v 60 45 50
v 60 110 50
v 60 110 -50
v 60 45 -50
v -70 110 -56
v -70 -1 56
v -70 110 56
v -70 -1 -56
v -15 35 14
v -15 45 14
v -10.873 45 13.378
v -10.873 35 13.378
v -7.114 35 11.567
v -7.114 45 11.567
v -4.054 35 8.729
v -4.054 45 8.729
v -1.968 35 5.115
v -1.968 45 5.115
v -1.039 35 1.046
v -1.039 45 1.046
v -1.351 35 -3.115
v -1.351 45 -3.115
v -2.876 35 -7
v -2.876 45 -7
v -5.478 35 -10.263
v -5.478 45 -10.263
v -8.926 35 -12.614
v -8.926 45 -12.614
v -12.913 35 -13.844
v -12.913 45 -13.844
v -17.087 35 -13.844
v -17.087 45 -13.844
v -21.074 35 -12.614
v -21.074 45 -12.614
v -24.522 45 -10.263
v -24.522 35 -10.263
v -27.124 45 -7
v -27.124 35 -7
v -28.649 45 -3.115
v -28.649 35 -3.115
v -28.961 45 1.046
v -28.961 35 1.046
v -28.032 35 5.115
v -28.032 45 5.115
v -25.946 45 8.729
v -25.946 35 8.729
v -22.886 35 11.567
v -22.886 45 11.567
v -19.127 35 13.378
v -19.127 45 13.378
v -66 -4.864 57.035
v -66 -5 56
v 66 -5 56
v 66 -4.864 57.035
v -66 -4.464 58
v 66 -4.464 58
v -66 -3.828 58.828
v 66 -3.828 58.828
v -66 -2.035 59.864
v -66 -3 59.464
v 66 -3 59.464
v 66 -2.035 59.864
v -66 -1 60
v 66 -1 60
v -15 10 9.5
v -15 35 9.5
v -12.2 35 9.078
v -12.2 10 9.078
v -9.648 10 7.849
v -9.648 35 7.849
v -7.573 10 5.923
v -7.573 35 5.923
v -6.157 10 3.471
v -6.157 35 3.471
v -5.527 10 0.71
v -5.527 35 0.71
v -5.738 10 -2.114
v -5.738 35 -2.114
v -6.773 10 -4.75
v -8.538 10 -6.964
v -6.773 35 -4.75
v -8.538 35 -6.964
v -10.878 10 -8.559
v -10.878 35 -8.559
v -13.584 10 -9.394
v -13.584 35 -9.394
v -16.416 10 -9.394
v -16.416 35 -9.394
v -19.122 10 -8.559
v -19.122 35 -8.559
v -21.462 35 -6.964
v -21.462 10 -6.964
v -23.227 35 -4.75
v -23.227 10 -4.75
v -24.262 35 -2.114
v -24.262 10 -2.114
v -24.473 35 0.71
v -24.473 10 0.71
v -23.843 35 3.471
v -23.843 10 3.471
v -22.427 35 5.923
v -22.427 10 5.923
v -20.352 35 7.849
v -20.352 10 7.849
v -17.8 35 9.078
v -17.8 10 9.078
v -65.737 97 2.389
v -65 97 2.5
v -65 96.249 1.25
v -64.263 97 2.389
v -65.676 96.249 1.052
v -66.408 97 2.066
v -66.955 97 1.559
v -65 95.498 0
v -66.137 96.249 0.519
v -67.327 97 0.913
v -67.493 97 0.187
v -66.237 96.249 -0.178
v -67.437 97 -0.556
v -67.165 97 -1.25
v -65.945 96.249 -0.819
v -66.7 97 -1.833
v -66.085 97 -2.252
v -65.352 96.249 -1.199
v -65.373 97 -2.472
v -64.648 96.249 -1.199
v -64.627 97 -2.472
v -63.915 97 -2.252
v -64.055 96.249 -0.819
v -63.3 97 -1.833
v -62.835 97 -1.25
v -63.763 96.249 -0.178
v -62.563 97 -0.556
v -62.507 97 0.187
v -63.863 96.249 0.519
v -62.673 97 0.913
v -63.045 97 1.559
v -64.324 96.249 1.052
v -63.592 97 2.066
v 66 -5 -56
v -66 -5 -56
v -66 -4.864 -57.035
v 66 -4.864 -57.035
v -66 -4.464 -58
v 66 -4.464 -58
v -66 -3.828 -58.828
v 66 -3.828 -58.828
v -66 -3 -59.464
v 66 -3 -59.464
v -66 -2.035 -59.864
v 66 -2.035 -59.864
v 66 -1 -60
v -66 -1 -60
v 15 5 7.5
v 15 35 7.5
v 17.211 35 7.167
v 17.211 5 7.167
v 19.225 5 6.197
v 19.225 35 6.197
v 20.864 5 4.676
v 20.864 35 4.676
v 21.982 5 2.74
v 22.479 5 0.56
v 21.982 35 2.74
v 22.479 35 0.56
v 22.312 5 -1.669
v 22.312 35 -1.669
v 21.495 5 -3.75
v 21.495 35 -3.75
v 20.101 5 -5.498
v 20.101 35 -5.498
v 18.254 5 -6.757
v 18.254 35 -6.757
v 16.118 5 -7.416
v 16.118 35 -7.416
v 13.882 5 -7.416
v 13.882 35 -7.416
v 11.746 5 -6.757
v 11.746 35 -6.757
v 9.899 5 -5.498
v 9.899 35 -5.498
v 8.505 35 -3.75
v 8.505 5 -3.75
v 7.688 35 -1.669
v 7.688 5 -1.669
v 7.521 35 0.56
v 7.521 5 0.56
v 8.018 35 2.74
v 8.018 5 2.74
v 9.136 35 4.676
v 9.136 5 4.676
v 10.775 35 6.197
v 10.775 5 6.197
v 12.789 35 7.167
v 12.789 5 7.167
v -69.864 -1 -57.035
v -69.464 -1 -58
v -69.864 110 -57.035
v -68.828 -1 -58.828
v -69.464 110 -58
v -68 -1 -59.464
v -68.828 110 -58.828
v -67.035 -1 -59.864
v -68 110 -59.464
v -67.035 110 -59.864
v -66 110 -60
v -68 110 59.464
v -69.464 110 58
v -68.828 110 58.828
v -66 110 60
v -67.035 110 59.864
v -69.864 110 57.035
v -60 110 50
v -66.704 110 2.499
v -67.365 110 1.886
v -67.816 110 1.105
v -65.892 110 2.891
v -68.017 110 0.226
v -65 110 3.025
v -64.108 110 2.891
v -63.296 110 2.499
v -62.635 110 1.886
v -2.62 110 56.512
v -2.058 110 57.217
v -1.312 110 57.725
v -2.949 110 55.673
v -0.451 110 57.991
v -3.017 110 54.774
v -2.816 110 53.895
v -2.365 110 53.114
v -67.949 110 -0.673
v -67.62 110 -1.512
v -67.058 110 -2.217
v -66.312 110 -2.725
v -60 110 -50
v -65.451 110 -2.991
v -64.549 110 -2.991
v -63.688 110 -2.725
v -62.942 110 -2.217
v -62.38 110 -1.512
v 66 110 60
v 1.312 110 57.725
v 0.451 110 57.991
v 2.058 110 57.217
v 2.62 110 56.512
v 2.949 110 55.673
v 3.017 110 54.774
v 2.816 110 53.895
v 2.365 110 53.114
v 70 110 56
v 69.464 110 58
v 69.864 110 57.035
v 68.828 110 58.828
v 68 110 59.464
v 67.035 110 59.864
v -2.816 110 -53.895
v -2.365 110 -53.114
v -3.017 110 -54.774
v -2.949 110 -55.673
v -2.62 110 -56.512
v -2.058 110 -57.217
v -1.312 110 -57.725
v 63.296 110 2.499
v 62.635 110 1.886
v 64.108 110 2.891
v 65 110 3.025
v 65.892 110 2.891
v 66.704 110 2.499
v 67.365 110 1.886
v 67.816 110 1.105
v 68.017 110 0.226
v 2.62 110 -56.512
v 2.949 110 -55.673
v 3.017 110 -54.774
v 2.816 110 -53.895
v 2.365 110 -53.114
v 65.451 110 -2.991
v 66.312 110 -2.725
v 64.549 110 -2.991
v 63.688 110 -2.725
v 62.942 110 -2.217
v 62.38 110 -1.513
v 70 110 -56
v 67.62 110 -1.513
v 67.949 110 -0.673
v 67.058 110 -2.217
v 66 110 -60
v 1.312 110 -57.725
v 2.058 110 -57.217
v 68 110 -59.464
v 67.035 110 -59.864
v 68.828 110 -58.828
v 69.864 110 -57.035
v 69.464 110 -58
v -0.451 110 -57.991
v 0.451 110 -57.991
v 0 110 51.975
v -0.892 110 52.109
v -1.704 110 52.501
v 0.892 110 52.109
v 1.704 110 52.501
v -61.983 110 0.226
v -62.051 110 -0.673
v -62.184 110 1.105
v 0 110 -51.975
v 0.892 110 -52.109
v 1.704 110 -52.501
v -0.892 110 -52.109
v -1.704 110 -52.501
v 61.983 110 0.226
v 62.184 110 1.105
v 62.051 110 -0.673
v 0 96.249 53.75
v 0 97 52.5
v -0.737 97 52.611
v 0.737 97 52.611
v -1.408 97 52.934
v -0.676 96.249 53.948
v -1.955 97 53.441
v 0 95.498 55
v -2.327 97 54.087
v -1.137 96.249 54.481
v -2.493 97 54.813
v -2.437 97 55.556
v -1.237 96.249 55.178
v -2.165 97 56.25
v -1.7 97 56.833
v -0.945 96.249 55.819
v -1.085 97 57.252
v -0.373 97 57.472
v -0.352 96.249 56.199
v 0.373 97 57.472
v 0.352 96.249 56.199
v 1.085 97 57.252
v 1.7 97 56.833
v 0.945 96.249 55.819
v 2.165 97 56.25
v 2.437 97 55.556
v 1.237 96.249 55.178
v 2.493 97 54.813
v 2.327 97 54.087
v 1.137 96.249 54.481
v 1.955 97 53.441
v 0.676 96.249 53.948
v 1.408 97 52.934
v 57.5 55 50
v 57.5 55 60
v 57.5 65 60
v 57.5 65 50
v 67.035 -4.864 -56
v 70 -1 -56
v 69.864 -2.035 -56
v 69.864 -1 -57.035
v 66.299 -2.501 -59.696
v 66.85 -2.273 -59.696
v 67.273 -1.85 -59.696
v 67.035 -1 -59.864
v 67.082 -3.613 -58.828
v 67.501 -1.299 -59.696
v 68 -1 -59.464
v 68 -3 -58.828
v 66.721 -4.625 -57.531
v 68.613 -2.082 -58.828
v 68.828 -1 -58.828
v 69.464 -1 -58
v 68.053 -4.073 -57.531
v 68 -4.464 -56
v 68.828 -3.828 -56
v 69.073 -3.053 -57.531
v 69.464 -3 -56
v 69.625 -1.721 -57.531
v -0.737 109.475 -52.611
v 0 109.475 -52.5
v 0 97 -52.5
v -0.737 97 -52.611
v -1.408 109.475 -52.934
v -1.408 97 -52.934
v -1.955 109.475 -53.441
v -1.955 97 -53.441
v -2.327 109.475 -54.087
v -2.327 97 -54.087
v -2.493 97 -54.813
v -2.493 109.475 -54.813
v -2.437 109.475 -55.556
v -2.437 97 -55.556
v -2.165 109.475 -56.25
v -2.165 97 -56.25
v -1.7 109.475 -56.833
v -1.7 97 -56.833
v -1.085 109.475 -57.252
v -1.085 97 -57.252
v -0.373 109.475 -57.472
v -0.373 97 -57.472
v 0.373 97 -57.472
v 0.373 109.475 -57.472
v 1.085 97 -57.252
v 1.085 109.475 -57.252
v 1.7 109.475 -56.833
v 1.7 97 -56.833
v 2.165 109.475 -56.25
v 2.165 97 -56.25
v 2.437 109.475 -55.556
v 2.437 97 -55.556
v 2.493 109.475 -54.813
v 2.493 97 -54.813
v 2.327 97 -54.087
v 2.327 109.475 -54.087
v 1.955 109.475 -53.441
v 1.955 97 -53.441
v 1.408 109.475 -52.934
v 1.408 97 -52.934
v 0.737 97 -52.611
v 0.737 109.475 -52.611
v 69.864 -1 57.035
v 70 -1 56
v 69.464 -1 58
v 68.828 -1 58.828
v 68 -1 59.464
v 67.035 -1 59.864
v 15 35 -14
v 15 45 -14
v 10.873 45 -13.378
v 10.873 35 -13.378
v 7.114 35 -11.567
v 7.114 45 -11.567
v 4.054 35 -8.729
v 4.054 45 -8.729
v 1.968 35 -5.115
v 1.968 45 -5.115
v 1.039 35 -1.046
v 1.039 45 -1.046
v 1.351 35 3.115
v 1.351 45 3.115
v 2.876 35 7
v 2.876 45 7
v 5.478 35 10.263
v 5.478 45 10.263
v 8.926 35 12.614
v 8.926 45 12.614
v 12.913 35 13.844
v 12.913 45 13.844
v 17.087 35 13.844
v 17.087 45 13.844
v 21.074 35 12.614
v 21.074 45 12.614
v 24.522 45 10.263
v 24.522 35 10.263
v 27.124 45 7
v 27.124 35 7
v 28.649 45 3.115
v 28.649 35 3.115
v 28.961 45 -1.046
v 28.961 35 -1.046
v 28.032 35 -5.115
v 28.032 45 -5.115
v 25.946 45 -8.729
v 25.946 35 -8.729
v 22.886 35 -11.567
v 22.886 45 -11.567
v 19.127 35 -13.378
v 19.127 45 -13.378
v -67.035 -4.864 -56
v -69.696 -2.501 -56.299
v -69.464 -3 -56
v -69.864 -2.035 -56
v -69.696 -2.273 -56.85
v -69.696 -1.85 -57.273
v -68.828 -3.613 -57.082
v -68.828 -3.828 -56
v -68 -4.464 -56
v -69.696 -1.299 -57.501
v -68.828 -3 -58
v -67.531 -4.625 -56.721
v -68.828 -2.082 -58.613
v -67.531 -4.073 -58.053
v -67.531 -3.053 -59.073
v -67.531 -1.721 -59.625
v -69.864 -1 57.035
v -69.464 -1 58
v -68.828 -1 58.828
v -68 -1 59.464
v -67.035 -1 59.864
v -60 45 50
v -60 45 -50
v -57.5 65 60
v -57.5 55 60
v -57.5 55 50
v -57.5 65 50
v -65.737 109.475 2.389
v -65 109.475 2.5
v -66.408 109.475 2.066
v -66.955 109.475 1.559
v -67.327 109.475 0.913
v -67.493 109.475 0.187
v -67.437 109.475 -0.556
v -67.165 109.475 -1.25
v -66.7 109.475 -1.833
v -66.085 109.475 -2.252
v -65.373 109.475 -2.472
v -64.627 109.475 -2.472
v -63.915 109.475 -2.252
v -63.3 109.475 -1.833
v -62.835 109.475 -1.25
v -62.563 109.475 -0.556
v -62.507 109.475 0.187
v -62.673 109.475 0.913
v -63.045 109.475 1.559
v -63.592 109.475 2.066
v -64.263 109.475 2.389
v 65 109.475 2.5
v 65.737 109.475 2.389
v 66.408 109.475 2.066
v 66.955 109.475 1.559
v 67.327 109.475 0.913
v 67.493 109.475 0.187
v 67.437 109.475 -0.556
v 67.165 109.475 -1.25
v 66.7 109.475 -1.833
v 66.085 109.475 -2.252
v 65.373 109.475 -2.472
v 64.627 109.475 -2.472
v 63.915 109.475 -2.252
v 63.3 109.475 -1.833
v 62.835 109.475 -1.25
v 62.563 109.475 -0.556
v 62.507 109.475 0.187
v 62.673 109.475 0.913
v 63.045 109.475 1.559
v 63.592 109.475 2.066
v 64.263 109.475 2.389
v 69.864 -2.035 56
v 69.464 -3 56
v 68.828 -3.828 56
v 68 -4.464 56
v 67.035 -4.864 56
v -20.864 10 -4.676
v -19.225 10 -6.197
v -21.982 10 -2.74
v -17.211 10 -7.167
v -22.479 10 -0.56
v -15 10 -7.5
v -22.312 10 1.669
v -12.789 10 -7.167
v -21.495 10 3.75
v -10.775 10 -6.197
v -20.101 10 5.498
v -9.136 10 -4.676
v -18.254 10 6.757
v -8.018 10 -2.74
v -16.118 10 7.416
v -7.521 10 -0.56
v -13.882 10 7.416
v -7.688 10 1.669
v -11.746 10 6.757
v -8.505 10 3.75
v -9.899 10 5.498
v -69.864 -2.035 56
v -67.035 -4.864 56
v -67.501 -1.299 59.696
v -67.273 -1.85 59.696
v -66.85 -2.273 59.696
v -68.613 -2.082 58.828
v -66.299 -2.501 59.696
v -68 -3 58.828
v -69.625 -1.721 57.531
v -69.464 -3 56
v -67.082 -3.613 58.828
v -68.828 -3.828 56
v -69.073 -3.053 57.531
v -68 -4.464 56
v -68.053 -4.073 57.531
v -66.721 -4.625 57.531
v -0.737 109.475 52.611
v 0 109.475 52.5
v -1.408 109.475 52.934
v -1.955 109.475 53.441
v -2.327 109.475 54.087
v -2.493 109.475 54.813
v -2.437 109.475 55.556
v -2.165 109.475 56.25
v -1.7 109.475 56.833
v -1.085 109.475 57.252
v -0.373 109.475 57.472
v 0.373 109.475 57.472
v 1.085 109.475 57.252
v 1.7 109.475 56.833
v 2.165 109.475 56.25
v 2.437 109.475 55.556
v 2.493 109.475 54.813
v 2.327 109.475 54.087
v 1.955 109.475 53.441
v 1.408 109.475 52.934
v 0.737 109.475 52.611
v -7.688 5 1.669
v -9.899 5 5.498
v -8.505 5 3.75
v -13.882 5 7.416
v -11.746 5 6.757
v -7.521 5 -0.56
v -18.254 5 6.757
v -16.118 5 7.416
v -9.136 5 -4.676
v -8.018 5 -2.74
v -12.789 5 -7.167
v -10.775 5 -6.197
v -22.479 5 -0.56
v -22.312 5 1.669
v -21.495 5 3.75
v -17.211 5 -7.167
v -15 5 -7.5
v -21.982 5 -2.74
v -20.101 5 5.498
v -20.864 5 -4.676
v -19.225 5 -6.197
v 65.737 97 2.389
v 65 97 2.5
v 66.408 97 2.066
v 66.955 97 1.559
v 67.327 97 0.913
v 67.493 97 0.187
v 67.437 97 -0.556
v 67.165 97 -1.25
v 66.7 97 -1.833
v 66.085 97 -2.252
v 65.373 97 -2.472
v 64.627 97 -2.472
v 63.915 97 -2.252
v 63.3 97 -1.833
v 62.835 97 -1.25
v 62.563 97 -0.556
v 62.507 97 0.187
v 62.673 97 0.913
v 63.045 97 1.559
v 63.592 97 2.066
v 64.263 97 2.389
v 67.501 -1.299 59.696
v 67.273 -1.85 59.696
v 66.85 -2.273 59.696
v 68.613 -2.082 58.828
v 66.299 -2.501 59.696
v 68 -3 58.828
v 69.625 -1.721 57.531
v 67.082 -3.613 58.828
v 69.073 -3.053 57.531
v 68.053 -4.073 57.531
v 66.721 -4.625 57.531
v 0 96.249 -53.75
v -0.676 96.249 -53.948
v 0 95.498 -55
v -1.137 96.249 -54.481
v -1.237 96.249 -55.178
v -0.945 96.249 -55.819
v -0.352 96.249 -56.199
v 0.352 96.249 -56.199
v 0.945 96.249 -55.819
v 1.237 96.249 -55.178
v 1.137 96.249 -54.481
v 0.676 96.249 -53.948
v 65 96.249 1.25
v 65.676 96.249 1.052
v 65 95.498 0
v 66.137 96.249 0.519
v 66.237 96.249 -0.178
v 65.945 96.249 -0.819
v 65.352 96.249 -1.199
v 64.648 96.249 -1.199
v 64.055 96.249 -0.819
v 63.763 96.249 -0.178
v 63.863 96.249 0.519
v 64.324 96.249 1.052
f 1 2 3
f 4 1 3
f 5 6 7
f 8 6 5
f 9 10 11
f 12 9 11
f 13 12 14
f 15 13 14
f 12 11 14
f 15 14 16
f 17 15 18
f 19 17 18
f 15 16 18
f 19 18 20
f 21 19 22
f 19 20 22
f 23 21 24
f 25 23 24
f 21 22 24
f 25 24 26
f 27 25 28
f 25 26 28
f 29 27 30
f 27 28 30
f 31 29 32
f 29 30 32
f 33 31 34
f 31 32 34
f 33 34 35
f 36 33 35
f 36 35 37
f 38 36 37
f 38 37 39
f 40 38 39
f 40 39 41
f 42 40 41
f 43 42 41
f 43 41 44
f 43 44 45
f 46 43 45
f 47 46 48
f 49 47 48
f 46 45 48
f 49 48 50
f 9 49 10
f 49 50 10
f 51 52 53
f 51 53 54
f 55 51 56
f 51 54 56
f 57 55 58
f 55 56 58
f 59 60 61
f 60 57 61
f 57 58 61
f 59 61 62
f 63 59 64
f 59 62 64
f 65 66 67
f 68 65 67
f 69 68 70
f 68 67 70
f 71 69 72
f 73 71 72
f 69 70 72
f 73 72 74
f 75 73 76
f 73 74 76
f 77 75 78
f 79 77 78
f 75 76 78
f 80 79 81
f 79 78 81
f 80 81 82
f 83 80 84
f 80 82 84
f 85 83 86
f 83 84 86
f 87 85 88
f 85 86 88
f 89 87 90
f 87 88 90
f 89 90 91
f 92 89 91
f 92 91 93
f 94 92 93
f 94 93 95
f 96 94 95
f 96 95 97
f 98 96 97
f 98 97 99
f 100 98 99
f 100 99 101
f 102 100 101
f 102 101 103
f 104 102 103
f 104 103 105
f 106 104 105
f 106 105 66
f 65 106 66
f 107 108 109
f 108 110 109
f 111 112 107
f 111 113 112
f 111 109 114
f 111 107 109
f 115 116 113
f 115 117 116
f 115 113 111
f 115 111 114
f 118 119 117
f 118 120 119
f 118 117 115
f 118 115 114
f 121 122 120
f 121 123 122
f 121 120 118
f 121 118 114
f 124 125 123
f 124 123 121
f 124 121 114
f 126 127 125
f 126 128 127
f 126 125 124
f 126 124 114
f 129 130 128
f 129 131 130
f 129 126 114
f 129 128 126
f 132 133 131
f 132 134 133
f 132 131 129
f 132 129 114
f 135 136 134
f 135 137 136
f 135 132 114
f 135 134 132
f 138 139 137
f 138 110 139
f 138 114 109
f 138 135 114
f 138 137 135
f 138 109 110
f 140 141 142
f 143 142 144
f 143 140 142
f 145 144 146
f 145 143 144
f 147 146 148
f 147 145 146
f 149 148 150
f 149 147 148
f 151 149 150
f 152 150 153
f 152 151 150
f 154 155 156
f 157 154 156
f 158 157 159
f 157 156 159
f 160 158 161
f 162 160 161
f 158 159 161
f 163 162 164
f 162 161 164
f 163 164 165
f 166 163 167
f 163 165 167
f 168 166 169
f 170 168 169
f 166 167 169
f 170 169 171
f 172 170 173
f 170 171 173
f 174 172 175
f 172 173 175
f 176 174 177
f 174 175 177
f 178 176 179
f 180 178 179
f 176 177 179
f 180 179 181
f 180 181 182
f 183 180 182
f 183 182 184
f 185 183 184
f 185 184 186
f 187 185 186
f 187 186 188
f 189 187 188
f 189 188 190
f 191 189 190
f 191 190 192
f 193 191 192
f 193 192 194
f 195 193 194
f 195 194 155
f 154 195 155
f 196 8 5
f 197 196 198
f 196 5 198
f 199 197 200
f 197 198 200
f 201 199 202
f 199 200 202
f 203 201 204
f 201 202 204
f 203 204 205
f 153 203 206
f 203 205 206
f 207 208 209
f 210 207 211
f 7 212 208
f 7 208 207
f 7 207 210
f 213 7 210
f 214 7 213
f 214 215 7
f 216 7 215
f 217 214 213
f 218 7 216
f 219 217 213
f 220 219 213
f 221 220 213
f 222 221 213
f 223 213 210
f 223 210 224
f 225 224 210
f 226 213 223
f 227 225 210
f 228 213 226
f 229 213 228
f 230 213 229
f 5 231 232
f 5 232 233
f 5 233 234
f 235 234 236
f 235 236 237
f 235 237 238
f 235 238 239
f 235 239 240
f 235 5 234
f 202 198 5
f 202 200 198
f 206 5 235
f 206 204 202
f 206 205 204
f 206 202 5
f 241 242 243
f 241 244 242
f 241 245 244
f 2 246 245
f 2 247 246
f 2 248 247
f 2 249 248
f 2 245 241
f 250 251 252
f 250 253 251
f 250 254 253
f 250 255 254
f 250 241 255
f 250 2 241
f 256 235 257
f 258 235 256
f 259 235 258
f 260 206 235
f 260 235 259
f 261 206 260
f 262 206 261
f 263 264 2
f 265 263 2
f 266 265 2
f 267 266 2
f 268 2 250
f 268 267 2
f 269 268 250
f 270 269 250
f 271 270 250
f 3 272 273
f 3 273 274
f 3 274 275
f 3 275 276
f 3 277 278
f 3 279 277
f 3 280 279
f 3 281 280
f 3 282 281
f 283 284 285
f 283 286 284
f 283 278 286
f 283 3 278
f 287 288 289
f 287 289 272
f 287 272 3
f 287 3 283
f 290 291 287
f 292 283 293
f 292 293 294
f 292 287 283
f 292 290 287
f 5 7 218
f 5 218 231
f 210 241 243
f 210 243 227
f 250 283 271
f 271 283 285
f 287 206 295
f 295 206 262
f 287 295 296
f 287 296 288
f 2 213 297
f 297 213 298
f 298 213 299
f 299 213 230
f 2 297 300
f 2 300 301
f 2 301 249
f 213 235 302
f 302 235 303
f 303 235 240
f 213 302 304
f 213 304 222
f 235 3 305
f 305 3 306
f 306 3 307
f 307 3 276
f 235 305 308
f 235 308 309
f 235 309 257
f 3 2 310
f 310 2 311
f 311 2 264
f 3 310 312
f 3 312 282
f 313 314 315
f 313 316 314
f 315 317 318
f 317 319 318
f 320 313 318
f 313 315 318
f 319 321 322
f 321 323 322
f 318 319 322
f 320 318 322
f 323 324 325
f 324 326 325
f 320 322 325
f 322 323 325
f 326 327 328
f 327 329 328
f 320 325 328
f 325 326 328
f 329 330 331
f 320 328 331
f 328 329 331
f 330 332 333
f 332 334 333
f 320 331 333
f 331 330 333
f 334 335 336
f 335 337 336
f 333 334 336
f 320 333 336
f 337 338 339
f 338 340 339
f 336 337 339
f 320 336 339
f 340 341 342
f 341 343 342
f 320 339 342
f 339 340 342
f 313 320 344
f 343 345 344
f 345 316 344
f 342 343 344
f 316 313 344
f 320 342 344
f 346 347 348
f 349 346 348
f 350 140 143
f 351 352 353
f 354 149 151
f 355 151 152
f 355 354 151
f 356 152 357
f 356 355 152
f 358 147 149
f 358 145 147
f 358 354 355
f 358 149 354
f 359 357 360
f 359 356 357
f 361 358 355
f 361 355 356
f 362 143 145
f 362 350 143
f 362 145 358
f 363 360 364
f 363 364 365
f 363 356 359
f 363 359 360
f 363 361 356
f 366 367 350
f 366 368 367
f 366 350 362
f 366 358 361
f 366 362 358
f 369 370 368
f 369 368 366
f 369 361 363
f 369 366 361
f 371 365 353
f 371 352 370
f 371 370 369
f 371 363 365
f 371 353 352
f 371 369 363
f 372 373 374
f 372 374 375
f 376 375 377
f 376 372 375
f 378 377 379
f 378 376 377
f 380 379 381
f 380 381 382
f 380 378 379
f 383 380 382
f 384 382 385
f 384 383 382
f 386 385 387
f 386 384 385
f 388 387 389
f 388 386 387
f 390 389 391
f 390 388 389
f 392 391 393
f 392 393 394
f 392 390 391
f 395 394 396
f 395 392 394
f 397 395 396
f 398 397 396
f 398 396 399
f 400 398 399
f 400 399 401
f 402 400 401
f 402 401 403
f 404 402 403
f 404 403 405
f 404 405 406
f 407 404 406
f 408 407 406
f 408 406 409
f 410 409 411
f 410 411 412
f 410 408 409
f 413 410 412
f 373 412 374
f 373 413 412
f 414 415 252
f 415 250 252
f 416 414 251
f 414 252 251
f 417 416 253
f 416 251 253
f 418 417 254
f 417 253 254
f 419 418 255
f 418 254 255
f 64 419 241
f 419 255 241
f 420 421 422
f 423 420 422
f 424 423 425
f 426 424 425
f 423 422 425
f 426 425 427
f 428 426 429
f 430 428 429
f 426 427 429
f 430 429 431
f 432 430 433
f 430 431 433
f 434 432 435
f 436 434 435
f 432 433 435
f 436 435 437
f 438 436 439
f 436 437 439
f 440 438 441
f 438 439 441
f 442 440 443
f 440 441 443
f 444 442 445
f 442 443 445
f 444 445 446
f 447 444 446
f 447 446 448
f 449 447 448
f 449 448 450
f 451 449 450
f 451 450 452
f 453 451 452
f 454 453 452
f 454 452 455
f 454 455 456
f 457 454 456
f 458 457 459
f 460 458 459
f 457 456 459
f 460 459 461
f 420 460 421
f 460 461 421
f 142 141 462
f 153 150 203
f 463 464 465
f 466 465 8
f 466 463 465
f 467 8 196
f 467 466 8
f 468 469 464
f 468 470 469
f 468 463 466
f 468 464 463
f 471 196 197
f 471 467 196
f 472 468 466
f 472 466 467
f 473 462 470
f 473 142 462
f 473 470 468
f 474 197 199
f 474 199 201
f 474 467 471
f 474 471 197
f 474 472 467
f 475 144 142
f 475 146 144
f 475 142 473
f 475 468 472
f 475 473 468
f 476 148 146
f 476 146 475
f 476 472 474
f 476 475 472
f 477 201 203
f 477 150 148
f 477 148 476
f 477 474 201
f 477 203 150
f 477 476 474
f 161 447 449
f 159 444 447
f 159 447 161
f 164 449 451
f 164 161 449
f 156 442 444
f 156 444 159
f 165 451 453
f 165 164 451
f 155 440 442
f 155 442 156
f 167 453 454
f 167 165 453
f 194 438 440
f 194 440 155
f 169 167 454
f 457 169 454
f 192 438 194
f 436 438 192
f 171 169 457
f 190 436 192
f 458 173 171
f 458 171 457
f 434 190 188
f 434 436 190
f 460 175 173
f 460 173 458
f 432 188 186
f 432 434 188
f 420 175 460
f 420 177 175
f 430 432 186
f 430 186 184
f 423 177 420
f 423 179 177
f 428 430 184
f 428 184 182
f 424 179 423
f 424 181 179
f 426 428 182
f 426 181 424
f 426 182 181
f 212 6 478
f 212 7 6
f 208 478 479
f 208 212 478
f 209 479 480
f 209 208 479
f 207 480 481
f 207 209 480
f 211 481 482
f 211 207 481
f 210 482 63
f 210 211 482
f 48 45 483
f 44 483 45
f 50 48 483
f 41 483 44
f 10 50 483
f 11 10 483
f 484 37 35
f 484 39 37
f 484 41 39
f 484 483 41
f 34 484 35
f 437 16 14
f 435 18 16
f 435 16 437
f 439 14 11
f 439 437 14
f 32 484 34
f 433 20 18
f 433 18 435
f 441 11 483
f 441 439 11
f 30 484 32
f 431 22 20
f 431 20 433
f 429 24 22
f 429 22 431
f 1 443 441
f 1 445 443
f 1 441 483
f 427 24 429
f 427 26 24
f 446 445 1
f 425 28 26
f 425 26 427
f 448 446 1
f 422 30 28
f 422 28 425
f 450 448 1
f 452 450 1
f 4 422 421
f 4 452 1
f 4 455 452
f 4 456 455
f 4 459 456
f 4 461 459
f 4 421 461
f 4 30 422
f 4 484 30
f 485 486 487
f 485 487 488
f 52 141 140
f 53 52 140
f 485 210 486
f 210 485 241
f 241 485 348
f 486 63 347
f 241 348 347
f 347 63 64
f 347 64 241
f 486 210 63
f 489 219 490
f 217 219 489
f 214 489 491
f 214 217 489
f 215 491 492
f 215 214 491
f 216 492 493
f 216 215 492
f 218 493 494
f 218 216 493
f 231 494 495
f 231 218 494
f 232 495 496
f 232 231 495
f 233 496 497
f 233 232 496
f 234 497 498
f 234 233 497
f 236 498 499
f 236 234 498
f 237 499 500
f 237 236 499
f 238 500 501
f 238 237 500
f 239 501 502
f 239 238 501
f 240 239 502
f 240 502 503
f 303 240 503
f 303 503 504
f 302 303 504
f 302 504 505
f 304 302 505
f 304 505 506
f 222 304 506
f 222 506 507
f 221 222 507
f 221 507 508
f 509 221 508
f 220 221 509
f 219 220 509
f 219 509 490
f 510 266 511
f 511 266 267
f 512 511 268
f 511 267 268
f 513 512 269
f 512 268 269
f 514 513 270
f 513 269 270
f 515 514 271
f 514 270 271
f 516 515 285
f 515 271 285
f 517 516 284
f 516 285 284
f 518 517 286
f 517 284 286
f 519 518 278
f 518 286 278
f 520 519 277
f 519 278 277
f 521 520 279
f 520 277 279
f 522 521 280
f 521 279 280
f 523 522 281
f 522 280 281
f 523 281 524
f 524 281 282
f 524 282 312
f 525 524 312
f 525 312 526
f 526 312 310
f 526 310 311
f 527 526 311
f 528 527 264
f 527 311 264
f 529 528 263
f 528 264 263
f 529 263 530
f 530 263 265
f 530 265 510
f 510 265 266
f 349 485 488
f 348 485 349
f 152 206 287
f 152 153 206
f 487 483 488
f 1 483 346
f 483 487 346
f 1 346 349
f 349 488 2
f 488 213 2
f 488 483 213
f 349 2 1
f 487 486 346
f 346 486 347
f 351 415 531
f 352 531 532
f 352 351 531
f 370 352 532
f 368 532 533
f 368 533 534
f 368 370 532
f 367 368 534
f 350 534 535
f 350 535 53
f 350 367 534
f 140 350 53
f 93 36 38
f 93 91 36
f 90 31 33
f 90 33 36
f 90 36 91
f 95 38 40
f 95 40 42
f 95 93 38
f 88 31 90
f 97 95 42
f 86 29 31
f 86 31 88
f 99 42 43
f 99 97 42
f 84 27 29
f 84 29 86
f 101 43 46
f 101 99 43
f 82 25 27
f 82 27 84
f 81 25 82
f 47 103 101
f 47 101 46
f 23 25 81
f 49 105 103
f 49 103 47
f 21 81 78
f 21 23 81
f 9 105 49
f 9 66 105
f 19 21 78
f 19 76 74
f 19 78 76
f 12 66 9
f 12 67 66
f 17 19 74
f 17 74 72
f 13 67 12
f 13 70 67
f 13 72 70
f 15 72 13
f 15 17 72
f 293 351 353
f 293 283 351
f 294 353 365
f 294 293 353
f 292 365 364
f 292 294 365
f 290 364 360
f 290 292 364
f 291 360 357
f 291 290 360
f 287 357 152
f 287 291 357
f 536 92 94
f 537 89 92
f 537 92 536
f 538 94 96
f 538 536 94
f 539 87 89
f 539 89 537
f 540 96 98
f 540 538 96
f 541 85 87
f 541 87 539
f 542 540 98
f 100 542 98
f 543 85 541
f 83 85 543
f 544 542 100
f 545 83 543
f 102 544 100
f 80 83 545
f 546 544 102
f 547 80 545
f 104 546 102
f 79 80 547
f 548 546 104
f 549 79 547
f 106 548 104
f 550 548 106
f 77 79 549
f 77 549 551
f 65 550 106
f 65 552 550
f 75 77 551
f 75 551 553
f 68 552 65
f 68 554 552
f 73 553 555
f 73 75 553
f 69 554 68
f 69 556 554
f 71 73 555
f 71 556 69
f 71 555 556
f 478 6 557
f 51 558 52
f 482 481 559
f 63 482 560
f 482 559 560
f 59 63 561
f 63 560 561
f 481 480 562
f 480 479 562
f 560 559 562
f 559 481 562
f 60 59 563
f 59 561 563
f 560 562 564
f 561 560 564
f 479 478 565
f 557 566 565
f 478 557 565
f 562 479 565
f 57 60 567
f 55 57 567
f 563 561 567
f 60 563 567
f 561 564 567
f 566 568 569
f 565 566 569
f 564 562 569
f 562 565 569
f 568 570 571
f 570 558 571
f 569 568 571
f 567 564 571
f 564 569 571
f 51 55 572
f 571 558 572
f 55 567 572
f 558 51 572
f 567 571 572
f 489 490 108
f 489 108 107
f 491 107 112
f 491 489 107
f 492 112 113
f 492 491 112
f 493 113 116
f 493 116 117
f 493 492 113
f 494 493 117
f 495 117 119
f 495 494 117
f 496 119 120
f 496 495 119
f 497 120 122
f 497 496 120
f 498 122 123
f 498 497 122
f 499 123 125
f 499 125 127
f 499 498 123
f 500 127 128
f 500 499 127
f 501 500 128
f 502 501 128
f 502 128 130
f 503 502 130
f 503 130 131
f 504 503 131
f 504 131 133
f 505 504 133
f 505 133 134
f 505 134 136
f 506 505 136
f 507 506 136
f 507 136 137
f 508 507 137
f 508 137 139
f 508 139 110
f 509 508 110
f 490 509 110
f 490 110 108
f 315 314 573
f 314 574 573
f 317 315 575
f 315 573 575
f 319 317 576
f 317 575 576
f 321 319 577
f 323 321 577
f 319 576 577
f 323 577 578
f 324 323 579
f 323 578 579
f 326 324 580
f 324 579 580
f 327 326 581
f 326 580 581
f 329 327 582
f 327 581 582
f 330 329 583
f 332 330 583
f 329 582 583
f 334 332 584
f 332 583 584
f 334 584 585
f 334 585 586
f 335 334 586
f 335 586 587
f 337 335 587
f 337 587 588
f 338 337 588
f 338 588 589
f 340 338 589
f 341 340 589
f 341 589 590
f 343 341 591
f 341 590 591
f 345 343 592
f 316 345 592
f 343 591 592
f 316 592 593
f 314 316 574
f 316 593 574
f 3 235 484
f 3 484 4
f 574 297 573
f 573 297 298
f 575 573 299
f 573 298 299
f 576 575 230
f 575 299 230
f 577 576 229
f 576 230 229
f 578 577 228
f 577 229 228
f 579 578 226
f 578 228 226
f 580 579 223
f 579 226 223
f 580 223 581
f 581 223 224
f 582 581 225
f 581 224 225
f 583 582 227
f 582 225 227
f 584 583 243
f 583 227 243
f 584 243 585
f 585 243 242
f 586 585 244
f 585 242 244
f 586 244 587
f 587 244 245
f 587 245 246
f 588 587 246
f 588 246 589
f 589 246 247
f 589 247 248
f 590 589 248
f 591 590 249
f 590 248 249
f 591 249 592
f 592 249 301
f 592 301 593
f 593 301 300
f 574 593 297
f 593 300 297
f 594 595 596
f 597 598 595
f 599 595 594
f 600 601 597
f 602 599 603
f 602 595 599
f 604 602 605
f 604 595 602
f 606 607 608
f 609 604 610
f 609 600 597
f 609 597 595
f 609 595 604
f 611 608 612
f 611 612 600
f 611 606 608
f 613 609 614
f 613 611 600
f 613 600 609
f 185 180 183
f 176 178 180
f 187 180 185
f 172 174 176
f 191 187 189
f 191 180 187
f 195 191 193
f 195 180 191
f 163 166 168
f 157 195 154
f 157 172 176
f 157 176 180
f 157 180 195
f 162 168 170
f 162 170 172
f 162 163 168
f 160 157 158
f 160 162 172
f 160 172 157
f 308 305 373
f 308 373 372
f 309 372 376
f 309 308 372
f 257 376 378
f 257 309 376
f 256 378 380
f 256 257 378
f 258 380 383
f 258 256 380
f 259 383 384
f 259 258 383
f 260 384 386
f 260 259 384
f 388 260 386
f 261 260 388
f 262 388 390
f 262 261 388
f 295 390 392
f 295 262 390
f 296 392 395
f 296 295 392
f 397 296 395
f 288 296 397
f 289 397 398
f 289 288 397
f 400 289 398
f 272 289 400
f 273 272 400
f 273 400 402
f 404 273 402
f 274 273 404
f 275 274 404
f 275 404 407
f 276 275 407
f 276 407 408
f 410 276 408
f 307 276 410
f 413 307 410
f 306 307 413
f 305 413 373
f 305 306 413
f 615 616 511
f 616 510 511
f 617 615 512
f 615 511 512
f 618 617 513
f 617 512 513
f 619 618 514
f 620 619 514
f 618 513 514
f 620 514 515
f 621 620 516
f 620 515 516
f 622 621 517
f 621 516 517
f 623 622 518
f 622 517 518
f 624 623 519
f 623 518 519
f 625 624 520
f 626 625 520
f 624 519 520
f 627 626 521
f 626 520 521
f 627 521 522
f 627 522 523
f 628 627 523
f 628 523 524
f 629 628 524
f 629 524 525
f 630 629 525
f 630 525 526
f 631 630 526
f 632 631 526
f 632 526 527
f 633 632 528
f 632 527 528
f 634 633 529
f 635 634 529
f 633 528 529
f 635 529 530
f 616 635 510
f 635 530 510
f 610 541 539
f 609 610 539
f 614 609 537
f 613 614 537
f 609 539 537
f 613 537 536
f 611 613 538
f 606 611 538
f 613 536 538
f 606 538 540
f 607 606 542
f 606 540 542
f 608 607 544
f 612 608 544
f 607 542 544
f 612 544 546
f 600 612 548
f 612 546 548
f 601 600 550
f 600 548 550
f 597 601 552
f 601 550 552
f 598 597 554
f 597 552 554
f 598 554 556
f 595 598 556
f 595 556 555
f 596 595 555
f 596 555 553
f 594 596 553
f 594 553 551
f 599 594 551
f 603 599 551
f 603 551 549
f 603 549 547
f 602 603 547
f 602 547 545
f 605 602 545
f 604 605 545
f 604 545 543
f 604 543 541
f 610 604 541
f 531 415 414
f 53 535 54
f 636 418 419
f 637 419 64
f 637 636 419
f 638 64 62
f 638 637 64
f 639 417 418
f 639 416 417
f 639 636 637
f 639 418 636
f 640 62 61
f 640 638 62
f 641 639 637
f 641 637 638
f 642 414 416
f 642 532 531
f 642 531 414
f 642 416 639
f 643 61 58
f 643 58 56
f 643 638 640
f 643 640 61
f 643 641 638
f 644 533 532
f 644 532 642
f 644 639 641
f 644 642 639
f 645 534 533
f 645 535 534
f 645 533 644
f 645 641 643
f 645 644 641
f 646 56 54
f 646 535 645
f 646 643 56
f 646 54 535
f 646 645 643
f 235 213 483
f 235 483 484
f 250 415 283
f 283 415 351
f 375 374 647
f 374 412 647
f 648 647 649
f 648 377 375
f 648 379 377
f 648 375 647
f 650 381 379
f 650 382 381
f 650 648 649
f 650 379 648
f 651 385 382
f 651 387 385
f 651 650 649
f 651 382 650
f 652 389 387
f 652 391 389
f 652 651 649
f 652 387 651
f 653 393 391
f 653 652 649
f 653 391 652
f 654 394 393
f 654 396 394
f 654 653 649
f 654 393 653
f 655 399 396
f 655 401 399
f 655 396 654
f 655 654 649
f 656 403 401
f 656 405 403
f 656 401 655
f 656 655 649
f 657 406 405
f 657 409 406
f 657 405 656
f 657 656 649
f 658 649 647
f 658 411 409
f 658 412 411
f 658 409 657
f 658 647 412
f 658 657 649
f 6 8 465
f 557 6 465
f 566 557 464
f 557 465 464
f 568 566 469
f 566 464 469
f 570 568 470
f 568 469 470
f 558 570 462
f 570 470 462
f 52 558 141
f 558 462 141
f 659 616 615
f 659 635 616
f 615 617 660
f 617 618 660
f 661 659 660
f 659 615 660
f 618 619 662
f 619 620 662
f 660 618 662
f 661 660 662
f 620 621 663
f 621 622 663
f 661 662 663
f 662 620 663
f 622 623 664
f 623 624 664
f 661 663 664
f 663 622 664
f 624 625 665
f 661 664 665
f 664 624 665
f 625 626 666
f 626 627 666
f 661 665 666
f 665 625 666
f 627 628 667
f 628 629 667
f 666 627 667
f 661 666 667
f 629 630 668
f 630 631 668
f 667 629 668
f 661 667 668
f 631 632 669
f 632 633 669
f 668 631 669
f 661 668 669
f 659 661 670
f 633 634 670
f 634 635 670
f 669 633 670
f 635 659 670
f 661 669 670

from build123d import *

# Parameters (mm, degrees)
BOX_EXTRUDE_PART_DEPTH         = 110
BOX_EXTRUDE_PART_DEPTH_BACK    = 5
BOX_TOP_VIEW_W                 = 140
BOX_TOP_VIEW_H                 = 120
INNER_BOX_CUT_W                = 120
INNER_BOX_CUT_H                = 100
INNER_BOX_CUT_1_DEPTH          = 65
SCISSOR_CROSSSECTION_W         = 115
SCISSOR_CROSSSECTION_H         = 10
SCISSOR_CORSSSECTION_CUT_DEPTH = 10
SHAFT_LOCATION_R               = 7.5
SHAFT_LOCATION_CUT_DEPTH       = 40
SKETCH2_R                      = 14
BEARING_LOCATION_CUT1_DEPTH    = 10
SKETCH8_R                      = 9.5
BEARING_LOCATION_CUT2_DEPTH    = 35
M6_TAPPED_HOLE3_AT_2_COUNT     = 2
M6_TAPPED_HOLE3_AT_2_PITCH     = 85.14693183
EDGES_FILLET_R                 = 4


with BuildPart() as part:
    # Box_top_view → Box_extrude_part (new, two sides: drawn at the far end of the back side and taken through both)
    with BuildSketch(Plane(origin=(0, 0, 0), x_dir=(1, 0, 0), z_dir=(0, 1, 0)).offset(-BOX_EXTRUDE_PART_DEPTH_BACK)):
        Rectangle(BOX_TOP_VIEW_W, BOX_TOP_VIEW_H)
    extrude(amount=BOX_EXTRUDE_PART_DEPTH + BOX_EXTRUDE_PART_DEPTH_BACK)

    # Inner_box_cut → Inner_box_cut_1 (cut)
    with BuildSketch(Plane(origin=(0, 110, 0), x_dir=(1, 0, 0), z_dir=(0, 1, 0))):
        Rectangle(INNER_BOX_CUT_W, INNER_BOX_CUT_H)
    extrude(amount=-INNER_BOX_CUT_1_DEPTH, mode=Mode.SUBTRACT)

    # Scissor_crossSection → Scissor_corssSection_cut (cut)
    with BuildSketch(Plane.XY.offset(60)):
        with Locations((0, 60)):
            Rectangle(SCISSOR_CROSSSECTION_W, SCISSOR_CROSSSECTION_H)
    extrude(amount=-SCISSOR_CORSSSECTION_CUT_DEPTH, mode=Mode.SUBTRACT)

    # Shaft_location → Shaft_location_cut (cut)
    with BuildSketch(Plane(origin=(0, 45, 0), x_dir=(1, 0, 0), z_dir=(0, 1, 0))):
        with Locations(Location((15, 0, 0), (0, 0, 270))):
            Circle(SHAFT_LOCATION_R)
        with Locations(Location((-15, 0, 0), (0, 0, 90))):
            Circle(SHAFT_LOCATION_R)
    extrude(amount=-SHAFT_LOCATION_CUT_DEPTH, mode=Mode.SUBTRACT)

    # Sketch2 → Bearing_location_cut1 (cut)
    with BuildSketch(Plane(origin=(0, 45, 0), x_dir=(1, 0, 0), z_dir=(0, 1, 0))):
        with Locations(Location((-15, 0, 0), (0, 0, 270))):
            Circle(SKETCH2_R)
        with Locations(Location((15, 0, 0), (0, 0, 90))):
            Circle(SKETCH2_R)
    extrude(amount=-BEARING_LOCATION_CUT1_DEPTH, mode=Mode.SUBTRACT)

    # Sketch8 → Bearing_location_cut2 (cut)
    with BuildSketch(Plane(origin=(0, 45, 0), x_dir=(1, 0, 0), z_dir=(0, 1, 0))):
        with Locations(Location((-15, 0, 0), (0, 0, 270))):
            Circle(SKETCH8_R)
    extrude(amount=-BEARING_LOCATION_CUT2_DEPTH, mode=Mode.SUBTRACT)

    # Sketch7 → M6 Tapped Hole3 (revolve, cut)
    with BuildSketch(Plane(origin=(0, 110, -55), x_dir=(0, 0, 1), z_dir=(1, 0, 0))):
        Polygon((0, 0), (0, 14.502151548), (2.5, 13), (2.5, 0.525), (3.025, 0), align=None)
    m6_tapped_hole3 = revolve(axis=Axis((0, 116.35, -55), (0, -1, 0)), mode=Mode.SUBTRACT)

    # M6 Tapped Hole3 at 2: M6 Tapped Hole3 ×2
    with Locations(*[Vector(-0.7633862853691146, 0, 0.645942241466174) * (i * M6_TAPPED_HOLE3_AT_2_PITCH) for i in range(1, M6_TAPPED_HOLE3_AT_2_COUNT)]):
        add(m6_tapped_hole3, mode=Mode.SUBTRACT)

    # M6_hole_mirror: M6 Tapped Hole3 across plane
    add(m6_tapped_hole3.mirror(Plane(origin=(0, 0, 0), x_dir=(0, 0, 1), z_dir=(1, 0, 0))), mode=Mode.SUBTRACT)

    # M6_hole_mirror copy 1 sketch → M6_hole_mirror copy 1 (revolve, cut)
    with BuildSketch(Plane(origin=(65, 110, 0), x_dir=(0, 0, 1), z_dir=(-1, 0, 0))):
        Polygon((0, 0), (0, -14.502151548), (2.5, -13), (2.5, -0.525), (3.025, 0), align=None)
    revolve(axis=Axis((65, 116.35, 0), (0, 1, 0)), mode=Mode.SUBTRACT)

    # M6_hole_mirror at the second plane: M6 Tapped Hole3 across plane
    add(m6_tapped_hole3.mirror(Plane.XY), mode=Mode.SUBTRACT)

    # M6_hole_mirror at the second plane copy → M6_hole_mirror at the second plane c 2 (revolve, cut)
    with BuildSketch(Plane(origin=(-65, 110, 0), x_dir=(0, 0, -1), z_dir=(1, 0, 0))):
        Polygon((0, 0), (0, -14.502151548), (2.5, -13), (2.5, -0.525), (3.025, 0), align=None)
    revolve(axis=Axis((-65, 116.35, 0), (0, 1, 0)), mode=Mode.SUBTRACT)

    # Edges_fillet
    edges_fillet_edges = [part.edges().sort_by_distance(p)[0] for p in [
        (70, -5, 0),
        (0, -5, -60),
        (-70, -5, 0),
        (-70, 52.5, -60),
        (70, 52.5, -60),
        (70, 52.5, 60),
        (-70, 52.5, 60),
        (0, -5, 60),
    ]]
    fillet(edges_fillet_edges, radius=EDGES_FILLET_R)


solid = part.part
